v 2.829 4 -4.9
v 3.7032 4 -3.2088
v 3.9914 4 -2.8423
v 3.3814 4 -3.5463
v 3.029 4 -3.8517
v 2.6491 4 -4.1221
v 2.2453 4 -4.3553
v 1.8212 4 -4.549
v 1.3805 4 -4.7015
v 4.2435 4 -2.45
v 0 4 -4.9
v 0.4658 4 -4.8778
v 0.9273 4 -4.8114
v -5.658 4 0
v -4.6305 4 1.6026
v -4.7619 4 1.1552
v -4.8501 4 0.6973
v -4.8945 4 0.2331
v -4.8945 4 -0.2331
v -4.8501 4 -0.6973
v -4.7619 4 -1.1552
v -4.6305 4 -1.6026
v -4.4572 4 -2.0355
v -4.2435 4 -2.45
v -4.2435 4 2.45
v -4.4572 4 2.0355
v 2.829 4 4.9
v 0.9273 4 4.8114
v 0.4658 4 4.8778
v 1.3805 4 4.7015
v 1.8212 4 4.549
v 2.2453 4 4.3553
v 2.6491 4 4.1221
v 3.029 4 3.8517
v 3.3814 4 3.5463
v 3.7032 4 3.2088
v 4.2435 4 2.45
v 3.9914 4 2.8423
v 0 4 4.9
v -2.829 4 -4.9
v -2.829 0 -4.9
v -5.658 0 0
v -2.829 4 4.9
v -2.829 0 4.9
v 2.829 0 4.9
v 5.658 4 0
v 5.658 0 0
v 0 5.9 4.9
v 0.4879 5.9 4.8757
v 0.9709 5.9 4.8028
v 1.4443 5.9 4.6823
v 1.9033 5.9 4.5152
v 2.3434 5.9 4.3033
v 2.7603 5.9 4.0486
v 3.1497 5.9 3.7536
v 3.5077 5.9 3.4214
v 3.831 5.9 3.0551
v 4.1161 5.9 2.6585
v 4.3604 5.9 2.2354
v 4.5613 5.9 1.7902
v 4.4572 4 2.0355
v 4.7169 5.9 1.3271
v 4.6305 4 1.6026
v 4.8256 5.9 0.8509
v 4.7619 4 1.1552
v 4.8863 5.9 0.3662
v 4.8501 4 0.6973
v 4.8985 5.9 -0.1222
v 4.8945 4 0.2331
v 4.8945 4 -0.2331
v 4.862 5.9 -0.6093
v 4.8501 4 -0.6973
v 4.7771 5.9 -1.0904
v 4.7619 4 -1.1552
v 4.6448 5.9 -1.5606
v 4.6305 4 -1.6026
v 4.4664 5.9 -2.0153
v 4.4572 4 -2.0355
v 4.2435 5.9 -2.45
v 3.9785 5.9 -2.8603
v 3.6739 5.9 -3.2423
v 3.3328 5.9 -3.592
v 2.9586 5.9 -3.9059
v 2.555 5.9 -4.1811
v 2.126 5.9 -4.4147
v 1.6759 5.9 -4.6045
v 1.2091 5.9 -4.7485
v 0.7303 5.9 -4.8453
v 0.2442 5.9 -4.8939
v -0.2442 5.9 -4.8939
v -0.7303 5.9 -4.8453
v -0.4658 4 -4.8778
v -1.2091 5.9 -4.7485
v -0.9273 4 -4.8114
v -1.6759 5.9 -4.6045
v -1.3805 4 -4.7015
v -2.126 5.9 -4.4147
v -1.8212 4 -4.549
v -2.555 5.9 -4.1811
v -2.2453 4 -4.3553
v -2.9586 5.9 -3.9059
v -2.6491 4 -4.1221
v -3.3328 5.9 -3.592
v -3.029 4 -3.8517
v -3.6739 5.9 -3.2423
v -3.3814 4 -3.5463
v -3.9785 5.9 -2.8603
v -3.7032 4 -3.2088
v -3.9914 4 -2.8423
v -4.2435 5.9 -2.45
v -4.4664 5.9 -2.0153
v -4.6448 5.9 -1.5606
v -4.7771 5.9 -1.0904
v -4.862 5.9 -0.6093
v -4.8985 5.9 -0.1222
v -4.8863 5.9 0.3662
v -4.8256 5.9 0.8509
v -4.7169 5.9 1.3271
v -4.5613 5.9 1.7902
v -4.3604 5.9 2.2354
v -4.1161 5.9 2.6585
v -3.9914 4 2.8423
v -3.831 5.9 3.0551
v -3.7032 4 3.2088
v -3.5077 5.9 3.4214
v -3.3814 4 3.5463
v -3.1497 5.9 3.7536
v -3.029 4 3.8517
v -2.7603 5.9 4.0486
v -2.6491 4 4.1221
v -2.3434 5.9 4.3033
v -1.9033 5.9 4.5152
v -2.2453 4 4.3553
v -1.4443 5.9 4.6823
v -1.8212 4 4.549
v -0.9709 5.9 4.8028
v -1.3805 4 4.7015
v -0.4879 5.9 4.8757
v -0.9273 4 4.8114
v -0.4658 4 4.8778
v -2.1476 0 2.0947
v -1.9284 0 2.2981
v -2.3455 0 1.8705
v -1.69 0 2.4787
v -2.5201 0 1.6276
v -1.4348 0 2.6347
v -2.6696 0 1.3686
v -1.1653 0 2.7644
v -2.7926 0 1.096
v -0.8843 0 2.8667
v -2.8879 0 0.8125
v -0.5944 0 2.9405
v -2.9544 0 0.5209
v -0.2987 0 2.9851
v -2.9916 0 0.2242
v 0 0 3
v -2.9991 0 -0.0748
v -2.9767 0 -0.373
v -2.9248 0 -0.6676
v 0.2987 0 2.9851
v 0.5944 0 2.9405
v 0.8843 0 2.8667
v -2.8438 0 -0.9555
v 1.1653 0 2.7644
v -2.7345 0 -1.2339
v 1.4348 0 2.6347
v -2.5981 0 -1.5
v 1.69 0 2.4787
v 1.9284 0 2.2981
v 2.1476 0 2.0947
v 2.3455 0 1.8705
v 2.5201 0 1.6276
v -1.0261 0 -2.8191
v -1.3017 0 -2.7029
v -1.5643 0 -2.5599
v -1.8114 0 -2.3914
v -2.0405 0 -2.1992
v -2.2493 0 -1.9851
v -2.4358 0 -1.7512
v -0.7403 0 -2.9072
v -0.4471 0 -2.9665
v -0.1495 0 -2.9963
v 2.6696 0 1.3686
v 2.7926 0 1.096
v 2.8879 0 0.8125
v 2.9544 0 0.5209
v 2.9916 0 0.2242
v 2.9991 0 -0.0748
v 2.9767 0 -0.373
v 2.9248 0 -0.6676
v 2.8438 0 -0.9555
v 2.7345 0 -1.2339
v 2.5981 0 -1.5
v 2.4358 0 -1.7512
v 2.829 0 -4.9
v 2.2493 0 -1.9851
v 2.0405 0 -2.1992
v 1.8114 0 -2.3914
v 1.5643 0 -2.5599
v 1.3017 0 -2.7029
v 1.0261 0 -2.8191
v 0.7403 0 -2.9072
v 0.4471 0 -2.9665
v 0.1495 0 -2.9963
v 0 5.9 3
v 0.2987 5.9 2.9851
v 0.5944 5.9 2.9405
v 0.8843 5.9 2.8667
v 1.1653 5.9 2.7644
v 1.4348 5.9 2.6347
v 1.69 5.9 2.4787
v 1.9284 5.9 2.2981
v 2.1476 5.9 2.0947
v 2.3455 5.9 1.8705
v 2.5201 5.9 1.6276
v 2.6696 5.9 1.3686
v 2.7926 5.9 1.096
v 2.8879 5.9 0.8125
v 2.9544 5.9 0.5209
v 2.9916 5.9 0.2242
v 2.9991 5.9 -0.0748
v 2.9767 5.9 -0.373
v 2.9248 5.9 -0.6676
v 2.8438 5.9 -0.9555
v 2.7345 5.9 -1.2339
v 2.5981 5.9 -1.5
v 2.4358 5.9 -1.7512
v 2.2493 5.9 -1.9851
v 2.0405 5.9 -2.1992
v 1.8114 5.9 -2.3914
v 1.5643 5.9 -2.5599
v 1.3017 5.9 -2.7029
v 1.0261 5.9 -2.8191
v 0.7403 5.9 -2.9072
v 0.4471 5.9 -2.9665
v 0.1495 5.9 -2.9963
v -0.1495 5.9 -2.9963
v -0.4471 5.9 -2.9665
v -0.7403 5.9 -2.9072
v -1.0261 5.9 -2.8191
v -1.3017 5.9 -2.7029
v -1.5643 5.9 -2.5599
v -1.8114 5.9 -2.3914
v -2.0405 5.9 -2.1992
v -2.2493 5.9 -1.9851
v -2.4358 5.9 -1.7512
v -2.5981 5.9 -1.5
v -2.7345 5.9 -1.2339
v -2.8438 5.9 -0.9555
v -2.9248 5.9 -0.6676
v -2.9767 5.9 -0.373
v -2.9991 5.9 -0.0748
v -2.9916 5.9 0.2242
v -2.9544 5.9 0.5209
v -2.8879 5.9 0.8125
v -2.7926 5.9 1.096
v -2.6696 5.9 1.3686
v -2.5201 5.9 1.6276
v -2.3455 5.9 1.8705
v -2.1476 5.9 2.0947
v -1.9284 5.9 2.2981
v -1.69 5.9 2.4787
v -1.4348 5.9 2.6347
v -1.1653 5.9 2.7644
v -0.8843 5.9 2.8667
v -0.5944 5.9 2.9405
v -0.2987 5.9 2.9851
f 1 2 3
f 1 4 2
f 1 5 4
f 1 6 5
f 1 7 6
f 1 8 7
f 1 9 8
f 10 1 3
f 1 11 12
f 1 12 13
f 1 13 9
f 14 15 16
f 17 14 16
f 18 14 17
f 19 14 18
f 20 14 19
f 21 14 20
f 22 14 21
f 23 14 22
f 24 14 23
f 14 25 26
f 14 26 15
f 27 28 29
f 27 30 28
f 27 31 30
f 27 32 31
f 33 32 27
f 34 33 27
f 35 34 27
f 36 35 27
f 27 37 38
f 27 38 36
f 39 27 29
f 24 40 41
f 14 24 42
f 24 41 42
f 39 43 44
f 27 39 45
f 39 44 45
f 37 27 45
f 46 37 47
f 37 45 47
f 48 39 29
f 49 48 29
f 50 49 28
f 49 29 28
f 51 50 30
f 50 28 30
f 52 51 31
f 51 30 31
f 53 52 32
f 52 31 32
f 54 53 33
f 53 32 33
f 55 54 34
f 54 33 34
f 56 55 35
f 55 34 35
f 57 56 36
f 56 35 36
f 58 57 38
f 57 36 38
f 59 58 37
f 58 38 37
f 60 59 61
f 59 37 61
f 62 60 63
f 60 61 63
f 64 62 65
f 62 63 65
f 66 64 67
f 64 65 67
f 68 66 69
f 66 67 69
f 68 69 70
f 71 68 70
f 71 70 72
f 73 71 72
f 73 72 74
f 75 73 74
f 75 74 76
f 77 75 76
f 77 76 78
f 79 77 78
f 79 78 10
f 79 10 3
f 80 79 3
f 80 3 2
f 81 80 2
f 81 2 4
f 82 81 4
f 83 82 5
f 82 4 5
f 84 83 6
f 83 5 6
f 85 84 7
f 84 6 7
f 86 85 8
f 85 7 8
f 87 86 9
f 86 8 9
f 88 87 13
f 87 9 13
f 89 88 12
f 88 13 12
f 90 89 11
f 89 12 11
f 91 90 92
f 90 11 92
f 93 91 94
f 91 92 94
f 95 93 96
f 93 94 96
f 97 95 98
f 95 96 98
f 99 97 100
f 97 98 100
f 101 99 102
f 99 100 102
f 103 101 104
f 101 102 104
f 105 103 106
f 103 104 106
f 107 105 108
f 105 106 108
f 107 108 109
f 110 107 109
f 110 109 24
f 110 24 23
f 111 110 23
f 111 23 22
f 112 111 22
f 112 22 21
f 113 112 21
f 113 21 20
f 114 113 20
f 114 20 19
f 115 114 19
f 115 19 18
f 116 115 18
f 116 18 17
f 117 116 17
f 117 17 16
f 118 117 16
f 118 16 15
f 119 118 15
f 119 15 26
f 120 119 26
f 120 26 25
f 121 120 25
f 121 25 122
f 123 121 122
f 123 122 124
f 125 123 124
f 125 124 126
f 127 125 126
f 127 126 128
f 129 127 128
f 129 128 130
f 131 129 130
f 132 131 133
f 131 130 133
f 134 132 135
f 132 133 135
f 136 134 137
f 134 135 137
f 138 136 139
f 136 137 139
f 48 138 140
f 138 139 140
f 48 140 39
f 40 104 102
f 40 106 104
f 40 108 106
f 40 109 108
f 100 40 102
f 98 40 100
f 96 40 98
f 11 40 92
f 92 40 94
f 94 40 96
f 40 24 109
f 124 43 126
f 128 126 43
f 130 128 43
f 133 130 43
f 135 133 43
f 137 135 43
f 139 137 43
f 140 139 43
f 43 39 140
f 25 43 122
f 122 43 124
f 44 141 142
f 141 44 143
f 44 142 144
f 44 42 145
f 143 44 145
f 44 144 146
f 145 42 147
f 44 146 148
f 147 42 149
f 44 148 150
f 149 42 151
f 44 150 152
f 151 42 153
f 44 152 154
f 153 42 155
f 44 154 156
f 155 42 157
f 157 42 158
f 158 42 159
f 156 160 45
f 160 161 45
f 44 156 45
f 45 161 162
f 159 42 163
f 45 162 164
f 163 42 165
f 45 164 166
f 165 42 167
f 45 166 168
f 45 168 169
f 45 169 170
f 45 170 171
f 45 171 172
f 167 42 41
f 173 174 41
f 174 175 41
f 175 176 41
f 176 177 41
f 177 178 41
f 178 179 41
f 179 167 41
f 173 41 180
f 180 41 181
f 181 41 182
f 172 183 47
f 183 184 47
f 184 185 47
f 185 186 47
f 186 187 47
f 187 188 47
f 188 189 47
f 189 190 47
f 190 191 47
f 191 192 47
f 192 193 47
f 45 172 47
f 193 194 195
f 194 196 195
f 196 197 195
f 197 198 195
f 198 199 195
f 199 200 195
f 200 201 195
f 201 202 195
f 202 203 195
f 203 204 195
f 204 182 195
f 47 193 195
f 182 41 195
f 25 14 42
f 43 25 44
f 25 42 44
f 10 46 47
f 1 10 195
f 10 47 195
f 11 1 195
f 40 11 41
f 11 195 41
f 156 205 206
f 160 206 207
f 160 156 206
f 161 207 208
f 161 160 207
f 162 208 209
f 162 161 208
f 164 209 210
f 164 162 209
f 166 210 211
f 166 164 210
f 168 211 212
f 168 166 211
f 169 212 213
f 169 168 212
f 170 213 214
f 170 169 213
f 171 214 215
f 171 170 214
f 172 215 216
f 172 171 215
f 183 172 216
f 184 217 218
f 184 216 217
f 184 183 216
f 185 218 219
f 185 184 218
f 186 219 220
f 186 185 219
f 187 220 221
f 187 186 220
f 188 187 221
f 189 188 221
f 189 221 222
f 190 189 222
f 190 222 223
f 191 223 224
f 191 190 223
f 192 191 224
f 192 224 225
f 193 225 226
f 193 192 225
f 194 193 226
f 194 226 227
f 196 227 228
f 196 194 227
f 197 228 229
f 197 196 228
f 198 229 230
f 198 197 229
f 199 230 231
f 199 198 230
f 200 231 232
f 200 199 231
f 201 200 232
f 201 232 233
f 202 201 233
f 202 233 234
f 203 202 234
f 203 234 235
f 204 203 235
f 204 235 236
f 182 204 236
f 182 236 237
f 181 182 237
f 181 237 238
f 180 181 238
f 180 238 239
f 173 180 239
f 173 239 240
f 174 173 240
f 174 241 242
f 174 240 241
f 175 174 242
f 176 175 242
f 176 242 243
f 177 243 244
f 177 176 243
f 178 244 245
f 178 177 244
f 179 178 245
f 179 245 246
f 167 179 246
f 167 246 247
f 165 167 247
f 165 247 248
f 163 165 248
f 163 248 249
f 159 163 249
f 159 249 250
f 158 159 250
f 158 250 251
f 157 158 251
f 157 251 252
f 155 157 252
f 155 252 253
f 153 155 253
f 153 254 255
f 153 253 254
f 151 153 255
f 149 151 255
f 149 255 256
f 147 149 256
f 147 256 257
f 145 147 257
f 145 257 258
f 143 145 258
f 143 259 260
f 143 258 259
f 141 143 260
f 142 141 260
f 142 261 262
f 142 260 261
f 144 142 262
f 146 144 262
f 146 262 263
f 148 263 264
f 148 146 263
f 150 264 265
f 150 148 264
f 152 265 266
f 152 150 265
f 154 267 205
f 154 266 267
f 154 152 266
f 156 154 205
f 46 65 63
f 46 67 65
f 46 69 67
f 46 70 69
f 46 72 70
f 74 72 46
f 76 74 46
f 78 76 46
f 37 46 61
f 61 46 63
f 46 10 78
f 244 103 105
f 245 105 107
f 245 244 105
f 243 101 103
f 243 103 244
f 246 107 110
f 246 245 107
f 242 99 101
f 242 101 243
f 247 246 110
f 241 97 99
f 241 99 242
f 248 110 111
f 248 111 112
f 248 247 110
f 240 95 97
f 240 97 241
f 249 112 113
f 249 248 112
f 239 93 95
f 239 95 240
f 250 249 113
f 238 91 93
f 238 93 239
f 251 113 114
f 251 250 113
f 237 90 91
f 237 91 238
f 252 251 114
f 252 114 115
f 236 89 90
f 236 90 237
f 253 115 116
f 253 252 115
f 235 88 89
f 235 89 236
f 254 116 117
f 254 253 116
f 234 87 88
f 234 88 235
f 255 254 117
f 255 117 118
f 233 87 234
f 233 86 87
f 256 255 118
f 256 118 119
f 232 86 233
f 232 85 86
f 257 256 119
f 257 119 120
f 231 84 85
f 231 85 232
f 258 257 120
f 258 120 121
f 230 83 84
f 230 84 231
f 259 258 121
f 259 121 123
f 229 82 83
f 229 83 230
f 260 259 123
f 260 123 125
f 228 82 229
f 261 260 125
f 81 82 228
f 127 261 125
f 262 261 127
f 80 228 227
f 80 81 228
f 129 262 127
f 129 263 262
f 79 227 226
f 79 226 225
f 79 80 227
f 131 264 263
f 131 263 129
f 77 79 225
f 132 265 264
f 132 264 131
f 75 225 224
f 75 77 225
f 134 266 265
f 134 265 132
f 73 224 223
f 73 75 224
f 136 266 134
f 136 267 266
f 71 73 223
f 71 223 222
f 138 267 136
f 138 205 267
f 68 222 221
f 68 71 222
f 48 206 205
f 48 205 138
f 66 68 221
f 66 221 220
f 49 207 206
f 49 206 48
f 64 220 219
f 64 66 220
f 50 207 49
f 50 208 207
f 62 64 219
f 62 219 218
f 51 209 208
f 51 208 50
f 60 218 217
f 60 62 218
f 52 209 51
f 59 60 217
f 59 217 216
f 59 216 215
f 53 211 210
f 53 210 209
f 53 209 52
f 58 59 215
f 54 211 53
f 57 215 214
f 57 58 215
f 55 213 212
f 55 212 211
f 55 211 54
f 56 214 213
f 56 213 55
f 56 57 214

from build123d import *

# Parameters (mm, degrees)
EXTRUDE_1_DEPTH     = 4
EXTRUDE_START       = 4
SKETCH_2_R          = 4.9
EXTRUDE_2_DEPTH     = 1.9
CUT_EXTRUDE_1_REACH = 11.531
SKETCH_3_R          = 3


with BuildPart() as part:
    # 草图1 → 凸台-拉伸1 (new body)
    with BuildSketch(Plane(origin=(0, 0, 0), x_dir=(1, 0, 0), z_dir=(0, 1, 0))):
        Polygon((5.658032638, 0), (2.829016319, 4.9), (-2.829016319, 4.9), (-5.658032638, 0), (-2.829016319, -4.9), (2.829016319, -4.9), align=None)
    extrude(amount=EXTRUDE_1_DEPTH)

    # 草图2 → 凸台-拉伸2 (add)
    with BuildSketch(Plane(origin=(0, 0, 0), x_dir=(1, 0, 0), z_dir=(0, 1, 0)).offset(EXTRUDE_START)):
        with Locations(Location((0, 0, 0), (0, 0, 270))):
            Circle(SKETCH_2_R)
    extrude(amount=EXTRUDE_2_DEPTH)

    # 草图3 → 切除-拉伸1 (cut, up to next)
    with BuildSketch(Plane(origin=(0, 0, 0), x_dir=(1, 0, 0), z_dir=(0, 1, 0)), mode=Mode.PRIVATE) as cut_extrude_1_sk1:
        with Locations(Location((0, 0, 0), (0, 0, 270))):
            Circle(SKETCH_3_R)
    cut_extrude_1_tool1 = extrude(cut_extrude_1_sk1.sketch, amount=CUT_EXTRUDE_1_REACH, mode=Mode.PRIVATE) & part.part
    add(cut_extrude_1_tool1.solids().sort_by_distance((0, 0, 0))[0], mode=Mode.SUBTRACT)


solid = part.part
